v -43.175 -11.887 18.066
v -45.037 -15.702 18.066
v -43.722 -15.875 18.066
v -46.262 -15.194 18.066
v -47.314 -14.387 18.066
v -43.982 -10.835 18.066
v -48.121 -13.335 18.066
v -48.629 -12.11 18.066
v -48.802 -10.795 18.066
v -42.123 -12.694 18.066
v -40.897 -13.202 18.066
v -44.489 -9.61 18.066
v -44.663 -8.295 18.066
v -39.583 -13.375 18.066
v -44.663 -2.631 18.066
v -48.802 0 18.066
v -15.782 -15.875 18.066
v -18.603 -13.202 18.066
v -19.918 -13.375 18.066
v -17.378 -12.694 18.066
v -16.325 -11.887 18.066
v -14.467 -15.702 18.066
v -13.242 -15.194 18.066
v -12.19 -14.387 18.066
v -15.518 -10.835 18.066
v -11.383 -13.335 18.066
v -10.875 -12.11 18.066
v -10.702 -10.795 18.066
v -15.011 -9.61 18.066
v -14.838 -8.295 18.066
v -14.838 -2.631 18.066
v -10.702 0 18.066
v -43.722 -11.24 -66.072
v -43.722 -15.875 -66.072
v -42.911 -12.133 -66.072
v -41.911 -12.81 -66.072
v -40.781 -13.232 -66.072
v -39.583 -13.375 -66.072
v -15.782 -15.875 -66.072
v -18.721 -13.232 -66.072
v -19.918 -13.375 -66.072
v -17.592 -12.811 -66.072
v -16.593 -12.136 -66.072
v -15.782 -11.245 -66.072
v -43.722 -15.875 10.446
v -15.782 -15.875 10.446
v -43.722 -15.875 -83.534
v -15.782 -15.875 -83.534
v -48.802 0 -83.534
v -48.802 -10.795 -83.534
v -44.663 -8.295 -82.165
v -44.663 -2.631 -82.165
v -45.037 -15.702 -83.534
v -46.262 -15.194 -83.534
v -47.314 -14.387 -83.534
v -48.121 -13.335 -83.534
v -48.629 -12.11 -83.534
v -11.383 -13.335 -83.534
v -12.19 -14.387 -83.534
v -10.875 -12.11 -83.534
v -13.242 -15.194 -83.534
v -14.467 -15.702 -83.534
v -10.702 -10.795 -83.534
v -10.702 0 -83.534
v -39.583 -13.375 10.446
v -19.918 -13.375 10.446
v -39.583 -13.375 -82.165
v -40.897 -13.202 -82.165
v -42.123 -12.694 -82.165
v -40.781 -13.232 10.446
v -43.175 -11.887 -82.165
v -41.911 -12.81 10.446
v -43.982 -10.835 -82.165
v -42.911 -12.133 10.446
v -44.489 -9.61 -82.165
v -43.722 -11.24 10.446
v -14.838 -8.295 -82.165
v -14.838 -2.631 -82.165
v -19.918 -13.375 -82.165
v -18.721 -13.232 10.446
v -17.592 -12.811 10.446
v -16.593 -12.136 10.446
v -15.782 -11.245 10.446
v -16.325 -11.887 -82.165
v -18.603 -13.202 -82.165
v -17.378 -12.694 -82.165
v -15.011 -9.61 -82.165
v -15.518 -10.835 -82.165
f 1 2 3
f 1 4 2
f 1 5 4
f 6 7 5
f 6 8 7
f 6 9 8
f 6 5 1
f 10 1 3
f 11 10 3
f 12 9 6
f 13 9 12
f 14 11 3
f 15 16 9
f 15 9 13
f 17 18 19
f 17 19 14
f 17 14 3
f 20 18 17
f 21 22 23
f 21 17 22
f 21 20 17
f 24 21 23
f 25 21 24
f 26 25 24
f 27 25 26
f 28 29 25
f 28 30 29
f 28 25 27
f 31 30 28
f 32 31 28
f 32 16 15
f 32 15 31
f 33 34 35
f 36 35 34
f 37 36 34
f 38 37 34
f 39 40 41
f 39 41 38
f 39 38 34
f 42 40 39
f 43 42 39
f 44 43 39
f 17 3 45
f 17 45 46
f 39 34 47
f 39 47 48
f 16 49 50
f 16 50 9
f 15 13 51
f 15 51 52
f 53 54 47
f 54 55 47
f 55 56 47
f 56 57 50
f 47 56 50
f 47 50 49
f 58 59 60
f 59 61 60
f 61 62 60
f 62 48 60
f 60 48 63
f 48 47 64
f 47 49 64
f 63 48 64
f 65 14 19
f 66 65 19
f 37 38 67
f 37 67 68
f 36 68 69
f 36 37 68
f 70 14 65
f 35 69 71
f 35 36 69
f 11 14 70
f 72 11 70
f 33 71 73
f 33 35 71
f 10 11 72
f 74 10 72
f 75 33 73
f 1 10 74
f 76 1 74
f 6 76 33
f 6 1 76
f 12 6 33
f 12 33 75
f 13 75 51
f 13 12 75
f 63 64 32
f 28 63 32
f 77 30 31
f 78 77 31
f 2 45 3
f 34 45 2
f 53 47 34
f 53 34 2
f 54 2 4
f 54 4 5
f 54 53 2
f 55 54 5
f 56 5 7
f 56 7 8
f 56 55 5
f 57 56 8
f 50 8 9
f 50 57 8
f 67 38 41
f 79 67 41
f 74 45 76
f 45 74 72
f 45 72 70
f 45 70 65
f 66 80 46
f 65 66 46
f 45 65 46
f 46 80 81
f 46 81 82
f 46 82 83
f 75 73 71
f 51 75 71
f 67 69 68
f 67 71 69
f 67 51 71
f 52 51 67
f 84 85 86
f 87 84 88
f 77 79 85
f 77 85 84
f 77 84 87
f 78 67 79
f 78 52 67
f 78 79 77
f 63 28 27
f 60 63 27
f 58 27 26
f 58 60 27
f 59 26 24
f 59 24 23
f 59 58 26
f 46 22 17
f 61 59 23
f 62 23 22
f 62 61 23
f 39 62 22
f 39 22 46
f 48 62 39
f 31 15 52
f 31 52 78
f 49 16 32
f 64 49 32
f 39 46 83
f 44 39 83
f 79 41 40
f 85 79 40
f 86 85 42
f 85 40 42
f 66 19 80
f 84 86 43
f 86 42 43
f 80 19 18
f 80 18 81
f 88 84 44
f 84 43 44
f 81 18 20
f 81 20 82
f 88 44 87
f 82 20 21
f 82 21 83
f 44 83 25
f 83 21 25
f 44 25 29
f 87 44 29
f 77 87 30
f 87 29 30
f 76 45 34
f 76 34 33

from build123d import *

# Parameters (mm, degrees)
F0_W         = 38.1
F0_H         = 101.6
F1_DEPTH     = 15.875
F2_W         = 27.94
F2_H         = 76.5175
F3_DEPTH     = 12.7
F4_W         = 29.8249544576
F4_H         = 10.7437949628
F5_DEPTH     = 100.23084
F6_T4_DEPTH  = 100.23084
F6_T10_DEPTH = 100.23084
F6_T16_DEPTH = 100.23084
F6_T23_DEPTH = 100.23084
F6_T29_DEPTH = 100.23084
F6_T35_DEPTH = 100.23084
F6_T41_DEPTH = 100.23084
F6_T47_DEPTH = 100.23084
F6_T54_DEPTH = 100.23084
F6_T60_DEPTH = 100.23084
F6_T63_DEPTH = 127


# Not quite as in the source:
# - a fillet or chamfer that OpenCascade refuses, or shapes differently, is made with other operations: its cross-section is extruded or revolved along the edge and cut away or added


with BuildPart() as f1:
    # F0 (on Front) → F1 (new body)
    with BuildSketch(Plane.XZ):
        with Locations((-29.7519958138, -32.7344046354)):
            Rectangle(F0_W, F0_H)
    extrude(amount=F1_DEPTH)

    # F2 (on face) → F3 (cut)
    with BuildSketch(Plane.XZ.offset(15.875)):
        with Locations((-29.7519958138, -27.8131546354)):
            Rectangle(F2_W, F2_H)
    extrude(amount=-F3_DEPTH, mode=Mode.SUBTRACT)

    # F4 (on face) → F5 (cut)
    with BuildSketch(Plane.XY.offset(18.0655953646)):
        with Locations((-29.750072863, -8.0031603575)):
            Rectangle(F4_W, F4_H)
    extrude(amount=-F5_DEPTH, mode=Mode.SUBTRACT)

    # F6: fillet of radius 5.08 on 4 edges, made by hand


with BuildPart() as f6_tool2:
    # F6_s3 → F6_t4 (new body)
    with BuildSketch(Plane.XY.offset(18.0655953646)):
        with BuildLine():
            ThreePointArc((-19.9175956342, -13.3750578389), (-16.3254931857, -11.8871602873), (-14.8375956342, -8.2950578389))
            Line((-14.8375956342, -8.2950578389), (-14.8375956342, -13.3750578389))
            Line((-14.8375956342, -13.3750578389), (-19.9175956342, -13.3750578389))
        make_face()
    extrude(amount=-F6_T4_DEPTH)

    split(bisect_by=Plane.YZ.offset(-15.7819958138), keep=Keep.BOTTOM)

    split(bisect_by=Plane.XY.offset(10.4455953646), keep=Keep.TOP)


with BuildPart() as f1_1:
    add(f1.part)

    # F6_t1: union F6_tool2
    add(f6_tool2.part)


with BuildPart() as f6_tool8:
    # F6_s9 → F6_t10 (new body)
    with BuildSketch(Plane.XY.offset(18.0655953646)):
        with BuildLine():
            ThreePointArc((-19.9175956342, -13.3750578389), (-16.3254931857, -11.8871602873), (-14.8375956342, -8.2950578389))
            Line((-14.8375956342, -8.2950578389), (-14.8375956342, -13.3750578389))
            Line((-14.8375956342, -13.3750578389), (-19.9175956342, -13.3750578389))
        make_face()
    extrude(amount=-F6_T10_DEPTH)

    split(bisect_by=Plane.YZ.offset(-15.7819958138), keep=Keep.TOP)

    split(bisect_by=Plane.XY.offset(10.4455953646), keep=Keep.TOP)


with BuildPart() as f1_2:
    add(f1_1.part)

    # F6_t7: union F6_tool8
    add(f6_tool8.part)


with BuildPart() as f6_tool14:
    # F6_s15 → F6_t16 (new body)
    with BuildSketch(Plane.XY.offset(18.0655953646)):
        with BuildLine():
            ThreePointArc((-19.9175956342, -13.3750578389), (-16.3254931857, -11.8871602873), (-14.8375956342, -8.2950578389))
            Line((-14.8375956342, -8.2950578389), (-14.8375956342, -13.3750578389))
            Line((-14.8375956342, -13.3750578389), (-19.9175956342, -13.3750578389))
        make_face()
    extrude(amount=-F6_T16_DEPTH)

    split(bisect_by=Plane.XY.offset(-66.0719046354), keep=Keep.TOP)

    split(bisect_by=Plane.YZ.offset(-15.7819958138), keep=Keep.TOP)

    split(bisect_by=Plane.XY.offset(10.4455953646), keep=Keep.BOTTOM)


with BuildPart() as f1_3:
    add(f1_2.part)

    # F6_t13: union F6_tool14
    add(f6_tool14.part)


with BuildPart() as f6_tool21:
    # F6_s22 → F6_t23 (new body)
    with BuildSketch(Plane.XY.offset(18.0655953646)):
        with BuildLine():
            ThreePointArc((-19.9175956342, -13.3750578389), (-16.3254931857, -11.8871602873), (-14.8375956342, -8.2950578389))
            Line((-14.8375956342, -8.2950578389), (-14.8375956342, -13.3750578389))
            Line((-14.8375956342, -13.3750578389), (-19.9175956342, -13.3750578389))
        make_face()
    extrude(amount=-F6_T23_DEPTH)

    split(bisect_by=Plane.XY.offset(-66.0719046354), keep=Keep.BOTTOM)

    split(bisect_by=Plane.YZ.offset(-15.7819958138), keep=Keep.BOTTOM)


with BuildPart() as f1_4:
    add(f1_3.part)

    # F6_t20: union F6_tool21
    add(f6_tool21.part)


with BuildPart() as f6_tool27:
    # F6_s28 → F6_t29 (new body)
    with BuildSketch(Plane.XY.offset(18.0655953646)):
        with BuildLine():
            ThreePointArc((-19.9175956342, -13.3750578389), (-16.3254931857, -11.8871602873), (-14.8375956342, -8.2950578389))
            Line((-14.8375956342, -8.2950578389), (-14.8375956342, -13.3750578389))
            Line((-14.8375956342, -13.3750578389), (-19.9175956342, -13.3750578389))
        make_face()
    extrude(amount=-F6_T29_DEPTH)

    split(bisect_by=Plane.XY.offset(-66.0719046354), keep=Keep.BOTTOM)

    split(bisect_by=Plane.YZ.offset(-15.7819958138), keep=Keep.TOP)


with BuildPart() as f1_5:
    add(f1_4.part)

    # F6_t26: union F6_tool27
    add(f6_tool27.part)


with BuildPart() as f6_tool33:
    # F6_s34 → F6_t35 (new body)
    with BuildSketch(Plane.XY.offset(18.0655953646)):
        with BuildLine():
            ThreePointArc((-39.5825500917, -13.3750578389), (-43.1746525402, -11.8871602873), (-44.6625500917, -8.2950578389))
            Line((-44.6625500917, -8.2950578389), (-44.6625500917, -13.3750578389))
            Line((-44.6625500917, -13.3750578389), (-39.5825500917, -13.3750578389))
        make_face()
    extrude(amount=-F6_T35_DEPTH)

    split(bisect_by=Plane.YZ.offset(-43.7219958138), keep=Keep.TOP)

    split(bisect_by=Plane.XY.offset(10.4455953646), keep=Keep.TOP)


with BuildPart() as f1_6:
    add(f1_5.part)

    # F6_t32: union F6_tool33
    add(f6_tool33.part)


with BuildPart() as f6_tool39:
    # F6_s40 → F6_t41 (new body)
    with BuildSketch(Plane.XY.offset(18.0655953646)):
        with BuildLine():
            ThreePointArc((-39.5825500917, -13.3750578389), (-43.1746525402, -11.8871602873), (-44.6625500917, -8.2950578389))
            Line((-44.6625500917, -8.2950578389), (-44.6625500917, -13.3750578389))
            Line((-44.6625500917, -13.3750578389), (-39.5825500917, -13.3750578389))
        make_face()
    extrude(amount=-F6_T41_DEPTH)

    split(bisect_by=Plane.YZ.offset(-43.7219958138), keep=Keep.BOTTOM)

    split(bisect_by=Plane.XY.offset(10.4455953646), keep=Keep.TOP)


with BuildPart() as f1_7:
    add(f1_6.part)

    # F6_t38: union F6_tool39
    add(f6_tool39.part)


with BuildPart() as f6_tool45:
    # F6_s46 → F6_t47 (new body)
    with BuildSketch(Plane.XY.offset(18.0655953646)):
        with BuildLine():
            ThreePointArc((-39.5825500917, -13.3750578389), (-43.1746525402, -11.8871602873), (-44.6625500917, -8.2950578389))
            Line((-44.6625500917, -8.2950578389), (-44.6625500917, -13.3750578389))
            Line((-44.6625500917, -13.3750578389), (-39.5825500917, -13.3750578389))
        make_face()
    extrude(amount=-F6_T47_DEPTH)

    split(bisect_by=Plane.YZ.offset(-43.7219958138), keep=Keep.BOTTOM)

    split(bisect_by=Plane.XY.offset(-66.0719046354), keep=Keep.TOP)

    split(bisect_by=Plane.XY.offset(10.4455953646), keep=Keep.BOTTOM)


with BuildPart() as f1_8:
    add(f1_7.part)

    # F6_t44: union F6_tool45
    add(f6_tool45.part)


with BuildPart() as f6_tool52:
    # F6_s53 → F6_t54 (new body)
    with BuildSketch(Plane.XY.offset(18.0655953646)):
        with BuildLine():
            ThreePointArc((-39.5825500917, -13.3750578389), (-43.1746525402, -11.8871602873), (-44.6625500917, -8.2950578389))
            Line((-44.6625500917, -8.2950578389), (-44.6625500917, -13.3750578389))
            Line((-44.6625500917, -13.3750578389), (-39.5825500917, -13.3750578389))
        make_face()
    extrude(amount=-F6_T54_DEPTH)

    split(bisect_by=Plane.YZ.offset(-43.7219958138), keep=Keep.TOP)

    split(bisect_by=Plane.XY.offset(-66.0719046354), keep=Keep.BOTTOM)


with BuildPart() as f1_9:
    add(f1_8.part)

    # F6_t51: union F6_tool52
    add(f6_tool52.part)


with BuildPart() as f6_tool58:
    # F6_s59 → F6_t60 (new body)
    with BuildSketch(Plane.XY.offset(18.0655953646)):
        with BuildLine():
            ThreePointArc((-39.5825500917, -13.3750578389), (-43.1746525402, -11.8871602873), (-44.6625500917, -8.2950578389))
            Line((-44.6625500917, -8.2950578389), (-44.6625500917, -13.3750578389))
            Line((-44.6625500917, -13.3750578389), (-39.5825500917, -13.3750578389))
        make_face()
    extrude(amount=-F6_T60_DEPTH)

    split(bisect_by=Plane.YZ.offset(-43.7219958138), keep=Keep.BOTTOM)

    split(bisect_by=Plane.XY.offset(-66.0719046354), keep=Keep.BOTTOM)


with BuildPart() as f1_10:
    add(f1_9.part)

    # F6_t57: union F6_tool58
    add(f6_tool58.part)

    # F6_s64 → F6_t63 (cut)
    with BuildSketch(Plane.XY.offset(-96.2344046354)):
        with BuildLine():
            ThreePointArc((-10.7019958138, -10.795), (-12.1898933654, -14.3871024484), (-15.7819958138, -15.875))
            Line((-15.7819958138, -15.875), (-10.7019958138, -15.875))
            Line((-10.7019958138, -15.875), (-10.7019958138, -10.795))
        make_face()
        with BuildLine():
            ThreePointArc((-43.7219958138, -15.875), (-47.3140982623, -14.3871024484), (-48.8019958138, -10.795))
            Line((-48.8019958138, -10.795), (-48.8019958138, -15.875))
            Line((-48.8019958138, -15.875), (-43.7219958138, -15.875))
        make_face()
    extrude(amount=F6_T63_DEPTH, mode=Mode.SUBTRACT)


solid = f1_10.part
